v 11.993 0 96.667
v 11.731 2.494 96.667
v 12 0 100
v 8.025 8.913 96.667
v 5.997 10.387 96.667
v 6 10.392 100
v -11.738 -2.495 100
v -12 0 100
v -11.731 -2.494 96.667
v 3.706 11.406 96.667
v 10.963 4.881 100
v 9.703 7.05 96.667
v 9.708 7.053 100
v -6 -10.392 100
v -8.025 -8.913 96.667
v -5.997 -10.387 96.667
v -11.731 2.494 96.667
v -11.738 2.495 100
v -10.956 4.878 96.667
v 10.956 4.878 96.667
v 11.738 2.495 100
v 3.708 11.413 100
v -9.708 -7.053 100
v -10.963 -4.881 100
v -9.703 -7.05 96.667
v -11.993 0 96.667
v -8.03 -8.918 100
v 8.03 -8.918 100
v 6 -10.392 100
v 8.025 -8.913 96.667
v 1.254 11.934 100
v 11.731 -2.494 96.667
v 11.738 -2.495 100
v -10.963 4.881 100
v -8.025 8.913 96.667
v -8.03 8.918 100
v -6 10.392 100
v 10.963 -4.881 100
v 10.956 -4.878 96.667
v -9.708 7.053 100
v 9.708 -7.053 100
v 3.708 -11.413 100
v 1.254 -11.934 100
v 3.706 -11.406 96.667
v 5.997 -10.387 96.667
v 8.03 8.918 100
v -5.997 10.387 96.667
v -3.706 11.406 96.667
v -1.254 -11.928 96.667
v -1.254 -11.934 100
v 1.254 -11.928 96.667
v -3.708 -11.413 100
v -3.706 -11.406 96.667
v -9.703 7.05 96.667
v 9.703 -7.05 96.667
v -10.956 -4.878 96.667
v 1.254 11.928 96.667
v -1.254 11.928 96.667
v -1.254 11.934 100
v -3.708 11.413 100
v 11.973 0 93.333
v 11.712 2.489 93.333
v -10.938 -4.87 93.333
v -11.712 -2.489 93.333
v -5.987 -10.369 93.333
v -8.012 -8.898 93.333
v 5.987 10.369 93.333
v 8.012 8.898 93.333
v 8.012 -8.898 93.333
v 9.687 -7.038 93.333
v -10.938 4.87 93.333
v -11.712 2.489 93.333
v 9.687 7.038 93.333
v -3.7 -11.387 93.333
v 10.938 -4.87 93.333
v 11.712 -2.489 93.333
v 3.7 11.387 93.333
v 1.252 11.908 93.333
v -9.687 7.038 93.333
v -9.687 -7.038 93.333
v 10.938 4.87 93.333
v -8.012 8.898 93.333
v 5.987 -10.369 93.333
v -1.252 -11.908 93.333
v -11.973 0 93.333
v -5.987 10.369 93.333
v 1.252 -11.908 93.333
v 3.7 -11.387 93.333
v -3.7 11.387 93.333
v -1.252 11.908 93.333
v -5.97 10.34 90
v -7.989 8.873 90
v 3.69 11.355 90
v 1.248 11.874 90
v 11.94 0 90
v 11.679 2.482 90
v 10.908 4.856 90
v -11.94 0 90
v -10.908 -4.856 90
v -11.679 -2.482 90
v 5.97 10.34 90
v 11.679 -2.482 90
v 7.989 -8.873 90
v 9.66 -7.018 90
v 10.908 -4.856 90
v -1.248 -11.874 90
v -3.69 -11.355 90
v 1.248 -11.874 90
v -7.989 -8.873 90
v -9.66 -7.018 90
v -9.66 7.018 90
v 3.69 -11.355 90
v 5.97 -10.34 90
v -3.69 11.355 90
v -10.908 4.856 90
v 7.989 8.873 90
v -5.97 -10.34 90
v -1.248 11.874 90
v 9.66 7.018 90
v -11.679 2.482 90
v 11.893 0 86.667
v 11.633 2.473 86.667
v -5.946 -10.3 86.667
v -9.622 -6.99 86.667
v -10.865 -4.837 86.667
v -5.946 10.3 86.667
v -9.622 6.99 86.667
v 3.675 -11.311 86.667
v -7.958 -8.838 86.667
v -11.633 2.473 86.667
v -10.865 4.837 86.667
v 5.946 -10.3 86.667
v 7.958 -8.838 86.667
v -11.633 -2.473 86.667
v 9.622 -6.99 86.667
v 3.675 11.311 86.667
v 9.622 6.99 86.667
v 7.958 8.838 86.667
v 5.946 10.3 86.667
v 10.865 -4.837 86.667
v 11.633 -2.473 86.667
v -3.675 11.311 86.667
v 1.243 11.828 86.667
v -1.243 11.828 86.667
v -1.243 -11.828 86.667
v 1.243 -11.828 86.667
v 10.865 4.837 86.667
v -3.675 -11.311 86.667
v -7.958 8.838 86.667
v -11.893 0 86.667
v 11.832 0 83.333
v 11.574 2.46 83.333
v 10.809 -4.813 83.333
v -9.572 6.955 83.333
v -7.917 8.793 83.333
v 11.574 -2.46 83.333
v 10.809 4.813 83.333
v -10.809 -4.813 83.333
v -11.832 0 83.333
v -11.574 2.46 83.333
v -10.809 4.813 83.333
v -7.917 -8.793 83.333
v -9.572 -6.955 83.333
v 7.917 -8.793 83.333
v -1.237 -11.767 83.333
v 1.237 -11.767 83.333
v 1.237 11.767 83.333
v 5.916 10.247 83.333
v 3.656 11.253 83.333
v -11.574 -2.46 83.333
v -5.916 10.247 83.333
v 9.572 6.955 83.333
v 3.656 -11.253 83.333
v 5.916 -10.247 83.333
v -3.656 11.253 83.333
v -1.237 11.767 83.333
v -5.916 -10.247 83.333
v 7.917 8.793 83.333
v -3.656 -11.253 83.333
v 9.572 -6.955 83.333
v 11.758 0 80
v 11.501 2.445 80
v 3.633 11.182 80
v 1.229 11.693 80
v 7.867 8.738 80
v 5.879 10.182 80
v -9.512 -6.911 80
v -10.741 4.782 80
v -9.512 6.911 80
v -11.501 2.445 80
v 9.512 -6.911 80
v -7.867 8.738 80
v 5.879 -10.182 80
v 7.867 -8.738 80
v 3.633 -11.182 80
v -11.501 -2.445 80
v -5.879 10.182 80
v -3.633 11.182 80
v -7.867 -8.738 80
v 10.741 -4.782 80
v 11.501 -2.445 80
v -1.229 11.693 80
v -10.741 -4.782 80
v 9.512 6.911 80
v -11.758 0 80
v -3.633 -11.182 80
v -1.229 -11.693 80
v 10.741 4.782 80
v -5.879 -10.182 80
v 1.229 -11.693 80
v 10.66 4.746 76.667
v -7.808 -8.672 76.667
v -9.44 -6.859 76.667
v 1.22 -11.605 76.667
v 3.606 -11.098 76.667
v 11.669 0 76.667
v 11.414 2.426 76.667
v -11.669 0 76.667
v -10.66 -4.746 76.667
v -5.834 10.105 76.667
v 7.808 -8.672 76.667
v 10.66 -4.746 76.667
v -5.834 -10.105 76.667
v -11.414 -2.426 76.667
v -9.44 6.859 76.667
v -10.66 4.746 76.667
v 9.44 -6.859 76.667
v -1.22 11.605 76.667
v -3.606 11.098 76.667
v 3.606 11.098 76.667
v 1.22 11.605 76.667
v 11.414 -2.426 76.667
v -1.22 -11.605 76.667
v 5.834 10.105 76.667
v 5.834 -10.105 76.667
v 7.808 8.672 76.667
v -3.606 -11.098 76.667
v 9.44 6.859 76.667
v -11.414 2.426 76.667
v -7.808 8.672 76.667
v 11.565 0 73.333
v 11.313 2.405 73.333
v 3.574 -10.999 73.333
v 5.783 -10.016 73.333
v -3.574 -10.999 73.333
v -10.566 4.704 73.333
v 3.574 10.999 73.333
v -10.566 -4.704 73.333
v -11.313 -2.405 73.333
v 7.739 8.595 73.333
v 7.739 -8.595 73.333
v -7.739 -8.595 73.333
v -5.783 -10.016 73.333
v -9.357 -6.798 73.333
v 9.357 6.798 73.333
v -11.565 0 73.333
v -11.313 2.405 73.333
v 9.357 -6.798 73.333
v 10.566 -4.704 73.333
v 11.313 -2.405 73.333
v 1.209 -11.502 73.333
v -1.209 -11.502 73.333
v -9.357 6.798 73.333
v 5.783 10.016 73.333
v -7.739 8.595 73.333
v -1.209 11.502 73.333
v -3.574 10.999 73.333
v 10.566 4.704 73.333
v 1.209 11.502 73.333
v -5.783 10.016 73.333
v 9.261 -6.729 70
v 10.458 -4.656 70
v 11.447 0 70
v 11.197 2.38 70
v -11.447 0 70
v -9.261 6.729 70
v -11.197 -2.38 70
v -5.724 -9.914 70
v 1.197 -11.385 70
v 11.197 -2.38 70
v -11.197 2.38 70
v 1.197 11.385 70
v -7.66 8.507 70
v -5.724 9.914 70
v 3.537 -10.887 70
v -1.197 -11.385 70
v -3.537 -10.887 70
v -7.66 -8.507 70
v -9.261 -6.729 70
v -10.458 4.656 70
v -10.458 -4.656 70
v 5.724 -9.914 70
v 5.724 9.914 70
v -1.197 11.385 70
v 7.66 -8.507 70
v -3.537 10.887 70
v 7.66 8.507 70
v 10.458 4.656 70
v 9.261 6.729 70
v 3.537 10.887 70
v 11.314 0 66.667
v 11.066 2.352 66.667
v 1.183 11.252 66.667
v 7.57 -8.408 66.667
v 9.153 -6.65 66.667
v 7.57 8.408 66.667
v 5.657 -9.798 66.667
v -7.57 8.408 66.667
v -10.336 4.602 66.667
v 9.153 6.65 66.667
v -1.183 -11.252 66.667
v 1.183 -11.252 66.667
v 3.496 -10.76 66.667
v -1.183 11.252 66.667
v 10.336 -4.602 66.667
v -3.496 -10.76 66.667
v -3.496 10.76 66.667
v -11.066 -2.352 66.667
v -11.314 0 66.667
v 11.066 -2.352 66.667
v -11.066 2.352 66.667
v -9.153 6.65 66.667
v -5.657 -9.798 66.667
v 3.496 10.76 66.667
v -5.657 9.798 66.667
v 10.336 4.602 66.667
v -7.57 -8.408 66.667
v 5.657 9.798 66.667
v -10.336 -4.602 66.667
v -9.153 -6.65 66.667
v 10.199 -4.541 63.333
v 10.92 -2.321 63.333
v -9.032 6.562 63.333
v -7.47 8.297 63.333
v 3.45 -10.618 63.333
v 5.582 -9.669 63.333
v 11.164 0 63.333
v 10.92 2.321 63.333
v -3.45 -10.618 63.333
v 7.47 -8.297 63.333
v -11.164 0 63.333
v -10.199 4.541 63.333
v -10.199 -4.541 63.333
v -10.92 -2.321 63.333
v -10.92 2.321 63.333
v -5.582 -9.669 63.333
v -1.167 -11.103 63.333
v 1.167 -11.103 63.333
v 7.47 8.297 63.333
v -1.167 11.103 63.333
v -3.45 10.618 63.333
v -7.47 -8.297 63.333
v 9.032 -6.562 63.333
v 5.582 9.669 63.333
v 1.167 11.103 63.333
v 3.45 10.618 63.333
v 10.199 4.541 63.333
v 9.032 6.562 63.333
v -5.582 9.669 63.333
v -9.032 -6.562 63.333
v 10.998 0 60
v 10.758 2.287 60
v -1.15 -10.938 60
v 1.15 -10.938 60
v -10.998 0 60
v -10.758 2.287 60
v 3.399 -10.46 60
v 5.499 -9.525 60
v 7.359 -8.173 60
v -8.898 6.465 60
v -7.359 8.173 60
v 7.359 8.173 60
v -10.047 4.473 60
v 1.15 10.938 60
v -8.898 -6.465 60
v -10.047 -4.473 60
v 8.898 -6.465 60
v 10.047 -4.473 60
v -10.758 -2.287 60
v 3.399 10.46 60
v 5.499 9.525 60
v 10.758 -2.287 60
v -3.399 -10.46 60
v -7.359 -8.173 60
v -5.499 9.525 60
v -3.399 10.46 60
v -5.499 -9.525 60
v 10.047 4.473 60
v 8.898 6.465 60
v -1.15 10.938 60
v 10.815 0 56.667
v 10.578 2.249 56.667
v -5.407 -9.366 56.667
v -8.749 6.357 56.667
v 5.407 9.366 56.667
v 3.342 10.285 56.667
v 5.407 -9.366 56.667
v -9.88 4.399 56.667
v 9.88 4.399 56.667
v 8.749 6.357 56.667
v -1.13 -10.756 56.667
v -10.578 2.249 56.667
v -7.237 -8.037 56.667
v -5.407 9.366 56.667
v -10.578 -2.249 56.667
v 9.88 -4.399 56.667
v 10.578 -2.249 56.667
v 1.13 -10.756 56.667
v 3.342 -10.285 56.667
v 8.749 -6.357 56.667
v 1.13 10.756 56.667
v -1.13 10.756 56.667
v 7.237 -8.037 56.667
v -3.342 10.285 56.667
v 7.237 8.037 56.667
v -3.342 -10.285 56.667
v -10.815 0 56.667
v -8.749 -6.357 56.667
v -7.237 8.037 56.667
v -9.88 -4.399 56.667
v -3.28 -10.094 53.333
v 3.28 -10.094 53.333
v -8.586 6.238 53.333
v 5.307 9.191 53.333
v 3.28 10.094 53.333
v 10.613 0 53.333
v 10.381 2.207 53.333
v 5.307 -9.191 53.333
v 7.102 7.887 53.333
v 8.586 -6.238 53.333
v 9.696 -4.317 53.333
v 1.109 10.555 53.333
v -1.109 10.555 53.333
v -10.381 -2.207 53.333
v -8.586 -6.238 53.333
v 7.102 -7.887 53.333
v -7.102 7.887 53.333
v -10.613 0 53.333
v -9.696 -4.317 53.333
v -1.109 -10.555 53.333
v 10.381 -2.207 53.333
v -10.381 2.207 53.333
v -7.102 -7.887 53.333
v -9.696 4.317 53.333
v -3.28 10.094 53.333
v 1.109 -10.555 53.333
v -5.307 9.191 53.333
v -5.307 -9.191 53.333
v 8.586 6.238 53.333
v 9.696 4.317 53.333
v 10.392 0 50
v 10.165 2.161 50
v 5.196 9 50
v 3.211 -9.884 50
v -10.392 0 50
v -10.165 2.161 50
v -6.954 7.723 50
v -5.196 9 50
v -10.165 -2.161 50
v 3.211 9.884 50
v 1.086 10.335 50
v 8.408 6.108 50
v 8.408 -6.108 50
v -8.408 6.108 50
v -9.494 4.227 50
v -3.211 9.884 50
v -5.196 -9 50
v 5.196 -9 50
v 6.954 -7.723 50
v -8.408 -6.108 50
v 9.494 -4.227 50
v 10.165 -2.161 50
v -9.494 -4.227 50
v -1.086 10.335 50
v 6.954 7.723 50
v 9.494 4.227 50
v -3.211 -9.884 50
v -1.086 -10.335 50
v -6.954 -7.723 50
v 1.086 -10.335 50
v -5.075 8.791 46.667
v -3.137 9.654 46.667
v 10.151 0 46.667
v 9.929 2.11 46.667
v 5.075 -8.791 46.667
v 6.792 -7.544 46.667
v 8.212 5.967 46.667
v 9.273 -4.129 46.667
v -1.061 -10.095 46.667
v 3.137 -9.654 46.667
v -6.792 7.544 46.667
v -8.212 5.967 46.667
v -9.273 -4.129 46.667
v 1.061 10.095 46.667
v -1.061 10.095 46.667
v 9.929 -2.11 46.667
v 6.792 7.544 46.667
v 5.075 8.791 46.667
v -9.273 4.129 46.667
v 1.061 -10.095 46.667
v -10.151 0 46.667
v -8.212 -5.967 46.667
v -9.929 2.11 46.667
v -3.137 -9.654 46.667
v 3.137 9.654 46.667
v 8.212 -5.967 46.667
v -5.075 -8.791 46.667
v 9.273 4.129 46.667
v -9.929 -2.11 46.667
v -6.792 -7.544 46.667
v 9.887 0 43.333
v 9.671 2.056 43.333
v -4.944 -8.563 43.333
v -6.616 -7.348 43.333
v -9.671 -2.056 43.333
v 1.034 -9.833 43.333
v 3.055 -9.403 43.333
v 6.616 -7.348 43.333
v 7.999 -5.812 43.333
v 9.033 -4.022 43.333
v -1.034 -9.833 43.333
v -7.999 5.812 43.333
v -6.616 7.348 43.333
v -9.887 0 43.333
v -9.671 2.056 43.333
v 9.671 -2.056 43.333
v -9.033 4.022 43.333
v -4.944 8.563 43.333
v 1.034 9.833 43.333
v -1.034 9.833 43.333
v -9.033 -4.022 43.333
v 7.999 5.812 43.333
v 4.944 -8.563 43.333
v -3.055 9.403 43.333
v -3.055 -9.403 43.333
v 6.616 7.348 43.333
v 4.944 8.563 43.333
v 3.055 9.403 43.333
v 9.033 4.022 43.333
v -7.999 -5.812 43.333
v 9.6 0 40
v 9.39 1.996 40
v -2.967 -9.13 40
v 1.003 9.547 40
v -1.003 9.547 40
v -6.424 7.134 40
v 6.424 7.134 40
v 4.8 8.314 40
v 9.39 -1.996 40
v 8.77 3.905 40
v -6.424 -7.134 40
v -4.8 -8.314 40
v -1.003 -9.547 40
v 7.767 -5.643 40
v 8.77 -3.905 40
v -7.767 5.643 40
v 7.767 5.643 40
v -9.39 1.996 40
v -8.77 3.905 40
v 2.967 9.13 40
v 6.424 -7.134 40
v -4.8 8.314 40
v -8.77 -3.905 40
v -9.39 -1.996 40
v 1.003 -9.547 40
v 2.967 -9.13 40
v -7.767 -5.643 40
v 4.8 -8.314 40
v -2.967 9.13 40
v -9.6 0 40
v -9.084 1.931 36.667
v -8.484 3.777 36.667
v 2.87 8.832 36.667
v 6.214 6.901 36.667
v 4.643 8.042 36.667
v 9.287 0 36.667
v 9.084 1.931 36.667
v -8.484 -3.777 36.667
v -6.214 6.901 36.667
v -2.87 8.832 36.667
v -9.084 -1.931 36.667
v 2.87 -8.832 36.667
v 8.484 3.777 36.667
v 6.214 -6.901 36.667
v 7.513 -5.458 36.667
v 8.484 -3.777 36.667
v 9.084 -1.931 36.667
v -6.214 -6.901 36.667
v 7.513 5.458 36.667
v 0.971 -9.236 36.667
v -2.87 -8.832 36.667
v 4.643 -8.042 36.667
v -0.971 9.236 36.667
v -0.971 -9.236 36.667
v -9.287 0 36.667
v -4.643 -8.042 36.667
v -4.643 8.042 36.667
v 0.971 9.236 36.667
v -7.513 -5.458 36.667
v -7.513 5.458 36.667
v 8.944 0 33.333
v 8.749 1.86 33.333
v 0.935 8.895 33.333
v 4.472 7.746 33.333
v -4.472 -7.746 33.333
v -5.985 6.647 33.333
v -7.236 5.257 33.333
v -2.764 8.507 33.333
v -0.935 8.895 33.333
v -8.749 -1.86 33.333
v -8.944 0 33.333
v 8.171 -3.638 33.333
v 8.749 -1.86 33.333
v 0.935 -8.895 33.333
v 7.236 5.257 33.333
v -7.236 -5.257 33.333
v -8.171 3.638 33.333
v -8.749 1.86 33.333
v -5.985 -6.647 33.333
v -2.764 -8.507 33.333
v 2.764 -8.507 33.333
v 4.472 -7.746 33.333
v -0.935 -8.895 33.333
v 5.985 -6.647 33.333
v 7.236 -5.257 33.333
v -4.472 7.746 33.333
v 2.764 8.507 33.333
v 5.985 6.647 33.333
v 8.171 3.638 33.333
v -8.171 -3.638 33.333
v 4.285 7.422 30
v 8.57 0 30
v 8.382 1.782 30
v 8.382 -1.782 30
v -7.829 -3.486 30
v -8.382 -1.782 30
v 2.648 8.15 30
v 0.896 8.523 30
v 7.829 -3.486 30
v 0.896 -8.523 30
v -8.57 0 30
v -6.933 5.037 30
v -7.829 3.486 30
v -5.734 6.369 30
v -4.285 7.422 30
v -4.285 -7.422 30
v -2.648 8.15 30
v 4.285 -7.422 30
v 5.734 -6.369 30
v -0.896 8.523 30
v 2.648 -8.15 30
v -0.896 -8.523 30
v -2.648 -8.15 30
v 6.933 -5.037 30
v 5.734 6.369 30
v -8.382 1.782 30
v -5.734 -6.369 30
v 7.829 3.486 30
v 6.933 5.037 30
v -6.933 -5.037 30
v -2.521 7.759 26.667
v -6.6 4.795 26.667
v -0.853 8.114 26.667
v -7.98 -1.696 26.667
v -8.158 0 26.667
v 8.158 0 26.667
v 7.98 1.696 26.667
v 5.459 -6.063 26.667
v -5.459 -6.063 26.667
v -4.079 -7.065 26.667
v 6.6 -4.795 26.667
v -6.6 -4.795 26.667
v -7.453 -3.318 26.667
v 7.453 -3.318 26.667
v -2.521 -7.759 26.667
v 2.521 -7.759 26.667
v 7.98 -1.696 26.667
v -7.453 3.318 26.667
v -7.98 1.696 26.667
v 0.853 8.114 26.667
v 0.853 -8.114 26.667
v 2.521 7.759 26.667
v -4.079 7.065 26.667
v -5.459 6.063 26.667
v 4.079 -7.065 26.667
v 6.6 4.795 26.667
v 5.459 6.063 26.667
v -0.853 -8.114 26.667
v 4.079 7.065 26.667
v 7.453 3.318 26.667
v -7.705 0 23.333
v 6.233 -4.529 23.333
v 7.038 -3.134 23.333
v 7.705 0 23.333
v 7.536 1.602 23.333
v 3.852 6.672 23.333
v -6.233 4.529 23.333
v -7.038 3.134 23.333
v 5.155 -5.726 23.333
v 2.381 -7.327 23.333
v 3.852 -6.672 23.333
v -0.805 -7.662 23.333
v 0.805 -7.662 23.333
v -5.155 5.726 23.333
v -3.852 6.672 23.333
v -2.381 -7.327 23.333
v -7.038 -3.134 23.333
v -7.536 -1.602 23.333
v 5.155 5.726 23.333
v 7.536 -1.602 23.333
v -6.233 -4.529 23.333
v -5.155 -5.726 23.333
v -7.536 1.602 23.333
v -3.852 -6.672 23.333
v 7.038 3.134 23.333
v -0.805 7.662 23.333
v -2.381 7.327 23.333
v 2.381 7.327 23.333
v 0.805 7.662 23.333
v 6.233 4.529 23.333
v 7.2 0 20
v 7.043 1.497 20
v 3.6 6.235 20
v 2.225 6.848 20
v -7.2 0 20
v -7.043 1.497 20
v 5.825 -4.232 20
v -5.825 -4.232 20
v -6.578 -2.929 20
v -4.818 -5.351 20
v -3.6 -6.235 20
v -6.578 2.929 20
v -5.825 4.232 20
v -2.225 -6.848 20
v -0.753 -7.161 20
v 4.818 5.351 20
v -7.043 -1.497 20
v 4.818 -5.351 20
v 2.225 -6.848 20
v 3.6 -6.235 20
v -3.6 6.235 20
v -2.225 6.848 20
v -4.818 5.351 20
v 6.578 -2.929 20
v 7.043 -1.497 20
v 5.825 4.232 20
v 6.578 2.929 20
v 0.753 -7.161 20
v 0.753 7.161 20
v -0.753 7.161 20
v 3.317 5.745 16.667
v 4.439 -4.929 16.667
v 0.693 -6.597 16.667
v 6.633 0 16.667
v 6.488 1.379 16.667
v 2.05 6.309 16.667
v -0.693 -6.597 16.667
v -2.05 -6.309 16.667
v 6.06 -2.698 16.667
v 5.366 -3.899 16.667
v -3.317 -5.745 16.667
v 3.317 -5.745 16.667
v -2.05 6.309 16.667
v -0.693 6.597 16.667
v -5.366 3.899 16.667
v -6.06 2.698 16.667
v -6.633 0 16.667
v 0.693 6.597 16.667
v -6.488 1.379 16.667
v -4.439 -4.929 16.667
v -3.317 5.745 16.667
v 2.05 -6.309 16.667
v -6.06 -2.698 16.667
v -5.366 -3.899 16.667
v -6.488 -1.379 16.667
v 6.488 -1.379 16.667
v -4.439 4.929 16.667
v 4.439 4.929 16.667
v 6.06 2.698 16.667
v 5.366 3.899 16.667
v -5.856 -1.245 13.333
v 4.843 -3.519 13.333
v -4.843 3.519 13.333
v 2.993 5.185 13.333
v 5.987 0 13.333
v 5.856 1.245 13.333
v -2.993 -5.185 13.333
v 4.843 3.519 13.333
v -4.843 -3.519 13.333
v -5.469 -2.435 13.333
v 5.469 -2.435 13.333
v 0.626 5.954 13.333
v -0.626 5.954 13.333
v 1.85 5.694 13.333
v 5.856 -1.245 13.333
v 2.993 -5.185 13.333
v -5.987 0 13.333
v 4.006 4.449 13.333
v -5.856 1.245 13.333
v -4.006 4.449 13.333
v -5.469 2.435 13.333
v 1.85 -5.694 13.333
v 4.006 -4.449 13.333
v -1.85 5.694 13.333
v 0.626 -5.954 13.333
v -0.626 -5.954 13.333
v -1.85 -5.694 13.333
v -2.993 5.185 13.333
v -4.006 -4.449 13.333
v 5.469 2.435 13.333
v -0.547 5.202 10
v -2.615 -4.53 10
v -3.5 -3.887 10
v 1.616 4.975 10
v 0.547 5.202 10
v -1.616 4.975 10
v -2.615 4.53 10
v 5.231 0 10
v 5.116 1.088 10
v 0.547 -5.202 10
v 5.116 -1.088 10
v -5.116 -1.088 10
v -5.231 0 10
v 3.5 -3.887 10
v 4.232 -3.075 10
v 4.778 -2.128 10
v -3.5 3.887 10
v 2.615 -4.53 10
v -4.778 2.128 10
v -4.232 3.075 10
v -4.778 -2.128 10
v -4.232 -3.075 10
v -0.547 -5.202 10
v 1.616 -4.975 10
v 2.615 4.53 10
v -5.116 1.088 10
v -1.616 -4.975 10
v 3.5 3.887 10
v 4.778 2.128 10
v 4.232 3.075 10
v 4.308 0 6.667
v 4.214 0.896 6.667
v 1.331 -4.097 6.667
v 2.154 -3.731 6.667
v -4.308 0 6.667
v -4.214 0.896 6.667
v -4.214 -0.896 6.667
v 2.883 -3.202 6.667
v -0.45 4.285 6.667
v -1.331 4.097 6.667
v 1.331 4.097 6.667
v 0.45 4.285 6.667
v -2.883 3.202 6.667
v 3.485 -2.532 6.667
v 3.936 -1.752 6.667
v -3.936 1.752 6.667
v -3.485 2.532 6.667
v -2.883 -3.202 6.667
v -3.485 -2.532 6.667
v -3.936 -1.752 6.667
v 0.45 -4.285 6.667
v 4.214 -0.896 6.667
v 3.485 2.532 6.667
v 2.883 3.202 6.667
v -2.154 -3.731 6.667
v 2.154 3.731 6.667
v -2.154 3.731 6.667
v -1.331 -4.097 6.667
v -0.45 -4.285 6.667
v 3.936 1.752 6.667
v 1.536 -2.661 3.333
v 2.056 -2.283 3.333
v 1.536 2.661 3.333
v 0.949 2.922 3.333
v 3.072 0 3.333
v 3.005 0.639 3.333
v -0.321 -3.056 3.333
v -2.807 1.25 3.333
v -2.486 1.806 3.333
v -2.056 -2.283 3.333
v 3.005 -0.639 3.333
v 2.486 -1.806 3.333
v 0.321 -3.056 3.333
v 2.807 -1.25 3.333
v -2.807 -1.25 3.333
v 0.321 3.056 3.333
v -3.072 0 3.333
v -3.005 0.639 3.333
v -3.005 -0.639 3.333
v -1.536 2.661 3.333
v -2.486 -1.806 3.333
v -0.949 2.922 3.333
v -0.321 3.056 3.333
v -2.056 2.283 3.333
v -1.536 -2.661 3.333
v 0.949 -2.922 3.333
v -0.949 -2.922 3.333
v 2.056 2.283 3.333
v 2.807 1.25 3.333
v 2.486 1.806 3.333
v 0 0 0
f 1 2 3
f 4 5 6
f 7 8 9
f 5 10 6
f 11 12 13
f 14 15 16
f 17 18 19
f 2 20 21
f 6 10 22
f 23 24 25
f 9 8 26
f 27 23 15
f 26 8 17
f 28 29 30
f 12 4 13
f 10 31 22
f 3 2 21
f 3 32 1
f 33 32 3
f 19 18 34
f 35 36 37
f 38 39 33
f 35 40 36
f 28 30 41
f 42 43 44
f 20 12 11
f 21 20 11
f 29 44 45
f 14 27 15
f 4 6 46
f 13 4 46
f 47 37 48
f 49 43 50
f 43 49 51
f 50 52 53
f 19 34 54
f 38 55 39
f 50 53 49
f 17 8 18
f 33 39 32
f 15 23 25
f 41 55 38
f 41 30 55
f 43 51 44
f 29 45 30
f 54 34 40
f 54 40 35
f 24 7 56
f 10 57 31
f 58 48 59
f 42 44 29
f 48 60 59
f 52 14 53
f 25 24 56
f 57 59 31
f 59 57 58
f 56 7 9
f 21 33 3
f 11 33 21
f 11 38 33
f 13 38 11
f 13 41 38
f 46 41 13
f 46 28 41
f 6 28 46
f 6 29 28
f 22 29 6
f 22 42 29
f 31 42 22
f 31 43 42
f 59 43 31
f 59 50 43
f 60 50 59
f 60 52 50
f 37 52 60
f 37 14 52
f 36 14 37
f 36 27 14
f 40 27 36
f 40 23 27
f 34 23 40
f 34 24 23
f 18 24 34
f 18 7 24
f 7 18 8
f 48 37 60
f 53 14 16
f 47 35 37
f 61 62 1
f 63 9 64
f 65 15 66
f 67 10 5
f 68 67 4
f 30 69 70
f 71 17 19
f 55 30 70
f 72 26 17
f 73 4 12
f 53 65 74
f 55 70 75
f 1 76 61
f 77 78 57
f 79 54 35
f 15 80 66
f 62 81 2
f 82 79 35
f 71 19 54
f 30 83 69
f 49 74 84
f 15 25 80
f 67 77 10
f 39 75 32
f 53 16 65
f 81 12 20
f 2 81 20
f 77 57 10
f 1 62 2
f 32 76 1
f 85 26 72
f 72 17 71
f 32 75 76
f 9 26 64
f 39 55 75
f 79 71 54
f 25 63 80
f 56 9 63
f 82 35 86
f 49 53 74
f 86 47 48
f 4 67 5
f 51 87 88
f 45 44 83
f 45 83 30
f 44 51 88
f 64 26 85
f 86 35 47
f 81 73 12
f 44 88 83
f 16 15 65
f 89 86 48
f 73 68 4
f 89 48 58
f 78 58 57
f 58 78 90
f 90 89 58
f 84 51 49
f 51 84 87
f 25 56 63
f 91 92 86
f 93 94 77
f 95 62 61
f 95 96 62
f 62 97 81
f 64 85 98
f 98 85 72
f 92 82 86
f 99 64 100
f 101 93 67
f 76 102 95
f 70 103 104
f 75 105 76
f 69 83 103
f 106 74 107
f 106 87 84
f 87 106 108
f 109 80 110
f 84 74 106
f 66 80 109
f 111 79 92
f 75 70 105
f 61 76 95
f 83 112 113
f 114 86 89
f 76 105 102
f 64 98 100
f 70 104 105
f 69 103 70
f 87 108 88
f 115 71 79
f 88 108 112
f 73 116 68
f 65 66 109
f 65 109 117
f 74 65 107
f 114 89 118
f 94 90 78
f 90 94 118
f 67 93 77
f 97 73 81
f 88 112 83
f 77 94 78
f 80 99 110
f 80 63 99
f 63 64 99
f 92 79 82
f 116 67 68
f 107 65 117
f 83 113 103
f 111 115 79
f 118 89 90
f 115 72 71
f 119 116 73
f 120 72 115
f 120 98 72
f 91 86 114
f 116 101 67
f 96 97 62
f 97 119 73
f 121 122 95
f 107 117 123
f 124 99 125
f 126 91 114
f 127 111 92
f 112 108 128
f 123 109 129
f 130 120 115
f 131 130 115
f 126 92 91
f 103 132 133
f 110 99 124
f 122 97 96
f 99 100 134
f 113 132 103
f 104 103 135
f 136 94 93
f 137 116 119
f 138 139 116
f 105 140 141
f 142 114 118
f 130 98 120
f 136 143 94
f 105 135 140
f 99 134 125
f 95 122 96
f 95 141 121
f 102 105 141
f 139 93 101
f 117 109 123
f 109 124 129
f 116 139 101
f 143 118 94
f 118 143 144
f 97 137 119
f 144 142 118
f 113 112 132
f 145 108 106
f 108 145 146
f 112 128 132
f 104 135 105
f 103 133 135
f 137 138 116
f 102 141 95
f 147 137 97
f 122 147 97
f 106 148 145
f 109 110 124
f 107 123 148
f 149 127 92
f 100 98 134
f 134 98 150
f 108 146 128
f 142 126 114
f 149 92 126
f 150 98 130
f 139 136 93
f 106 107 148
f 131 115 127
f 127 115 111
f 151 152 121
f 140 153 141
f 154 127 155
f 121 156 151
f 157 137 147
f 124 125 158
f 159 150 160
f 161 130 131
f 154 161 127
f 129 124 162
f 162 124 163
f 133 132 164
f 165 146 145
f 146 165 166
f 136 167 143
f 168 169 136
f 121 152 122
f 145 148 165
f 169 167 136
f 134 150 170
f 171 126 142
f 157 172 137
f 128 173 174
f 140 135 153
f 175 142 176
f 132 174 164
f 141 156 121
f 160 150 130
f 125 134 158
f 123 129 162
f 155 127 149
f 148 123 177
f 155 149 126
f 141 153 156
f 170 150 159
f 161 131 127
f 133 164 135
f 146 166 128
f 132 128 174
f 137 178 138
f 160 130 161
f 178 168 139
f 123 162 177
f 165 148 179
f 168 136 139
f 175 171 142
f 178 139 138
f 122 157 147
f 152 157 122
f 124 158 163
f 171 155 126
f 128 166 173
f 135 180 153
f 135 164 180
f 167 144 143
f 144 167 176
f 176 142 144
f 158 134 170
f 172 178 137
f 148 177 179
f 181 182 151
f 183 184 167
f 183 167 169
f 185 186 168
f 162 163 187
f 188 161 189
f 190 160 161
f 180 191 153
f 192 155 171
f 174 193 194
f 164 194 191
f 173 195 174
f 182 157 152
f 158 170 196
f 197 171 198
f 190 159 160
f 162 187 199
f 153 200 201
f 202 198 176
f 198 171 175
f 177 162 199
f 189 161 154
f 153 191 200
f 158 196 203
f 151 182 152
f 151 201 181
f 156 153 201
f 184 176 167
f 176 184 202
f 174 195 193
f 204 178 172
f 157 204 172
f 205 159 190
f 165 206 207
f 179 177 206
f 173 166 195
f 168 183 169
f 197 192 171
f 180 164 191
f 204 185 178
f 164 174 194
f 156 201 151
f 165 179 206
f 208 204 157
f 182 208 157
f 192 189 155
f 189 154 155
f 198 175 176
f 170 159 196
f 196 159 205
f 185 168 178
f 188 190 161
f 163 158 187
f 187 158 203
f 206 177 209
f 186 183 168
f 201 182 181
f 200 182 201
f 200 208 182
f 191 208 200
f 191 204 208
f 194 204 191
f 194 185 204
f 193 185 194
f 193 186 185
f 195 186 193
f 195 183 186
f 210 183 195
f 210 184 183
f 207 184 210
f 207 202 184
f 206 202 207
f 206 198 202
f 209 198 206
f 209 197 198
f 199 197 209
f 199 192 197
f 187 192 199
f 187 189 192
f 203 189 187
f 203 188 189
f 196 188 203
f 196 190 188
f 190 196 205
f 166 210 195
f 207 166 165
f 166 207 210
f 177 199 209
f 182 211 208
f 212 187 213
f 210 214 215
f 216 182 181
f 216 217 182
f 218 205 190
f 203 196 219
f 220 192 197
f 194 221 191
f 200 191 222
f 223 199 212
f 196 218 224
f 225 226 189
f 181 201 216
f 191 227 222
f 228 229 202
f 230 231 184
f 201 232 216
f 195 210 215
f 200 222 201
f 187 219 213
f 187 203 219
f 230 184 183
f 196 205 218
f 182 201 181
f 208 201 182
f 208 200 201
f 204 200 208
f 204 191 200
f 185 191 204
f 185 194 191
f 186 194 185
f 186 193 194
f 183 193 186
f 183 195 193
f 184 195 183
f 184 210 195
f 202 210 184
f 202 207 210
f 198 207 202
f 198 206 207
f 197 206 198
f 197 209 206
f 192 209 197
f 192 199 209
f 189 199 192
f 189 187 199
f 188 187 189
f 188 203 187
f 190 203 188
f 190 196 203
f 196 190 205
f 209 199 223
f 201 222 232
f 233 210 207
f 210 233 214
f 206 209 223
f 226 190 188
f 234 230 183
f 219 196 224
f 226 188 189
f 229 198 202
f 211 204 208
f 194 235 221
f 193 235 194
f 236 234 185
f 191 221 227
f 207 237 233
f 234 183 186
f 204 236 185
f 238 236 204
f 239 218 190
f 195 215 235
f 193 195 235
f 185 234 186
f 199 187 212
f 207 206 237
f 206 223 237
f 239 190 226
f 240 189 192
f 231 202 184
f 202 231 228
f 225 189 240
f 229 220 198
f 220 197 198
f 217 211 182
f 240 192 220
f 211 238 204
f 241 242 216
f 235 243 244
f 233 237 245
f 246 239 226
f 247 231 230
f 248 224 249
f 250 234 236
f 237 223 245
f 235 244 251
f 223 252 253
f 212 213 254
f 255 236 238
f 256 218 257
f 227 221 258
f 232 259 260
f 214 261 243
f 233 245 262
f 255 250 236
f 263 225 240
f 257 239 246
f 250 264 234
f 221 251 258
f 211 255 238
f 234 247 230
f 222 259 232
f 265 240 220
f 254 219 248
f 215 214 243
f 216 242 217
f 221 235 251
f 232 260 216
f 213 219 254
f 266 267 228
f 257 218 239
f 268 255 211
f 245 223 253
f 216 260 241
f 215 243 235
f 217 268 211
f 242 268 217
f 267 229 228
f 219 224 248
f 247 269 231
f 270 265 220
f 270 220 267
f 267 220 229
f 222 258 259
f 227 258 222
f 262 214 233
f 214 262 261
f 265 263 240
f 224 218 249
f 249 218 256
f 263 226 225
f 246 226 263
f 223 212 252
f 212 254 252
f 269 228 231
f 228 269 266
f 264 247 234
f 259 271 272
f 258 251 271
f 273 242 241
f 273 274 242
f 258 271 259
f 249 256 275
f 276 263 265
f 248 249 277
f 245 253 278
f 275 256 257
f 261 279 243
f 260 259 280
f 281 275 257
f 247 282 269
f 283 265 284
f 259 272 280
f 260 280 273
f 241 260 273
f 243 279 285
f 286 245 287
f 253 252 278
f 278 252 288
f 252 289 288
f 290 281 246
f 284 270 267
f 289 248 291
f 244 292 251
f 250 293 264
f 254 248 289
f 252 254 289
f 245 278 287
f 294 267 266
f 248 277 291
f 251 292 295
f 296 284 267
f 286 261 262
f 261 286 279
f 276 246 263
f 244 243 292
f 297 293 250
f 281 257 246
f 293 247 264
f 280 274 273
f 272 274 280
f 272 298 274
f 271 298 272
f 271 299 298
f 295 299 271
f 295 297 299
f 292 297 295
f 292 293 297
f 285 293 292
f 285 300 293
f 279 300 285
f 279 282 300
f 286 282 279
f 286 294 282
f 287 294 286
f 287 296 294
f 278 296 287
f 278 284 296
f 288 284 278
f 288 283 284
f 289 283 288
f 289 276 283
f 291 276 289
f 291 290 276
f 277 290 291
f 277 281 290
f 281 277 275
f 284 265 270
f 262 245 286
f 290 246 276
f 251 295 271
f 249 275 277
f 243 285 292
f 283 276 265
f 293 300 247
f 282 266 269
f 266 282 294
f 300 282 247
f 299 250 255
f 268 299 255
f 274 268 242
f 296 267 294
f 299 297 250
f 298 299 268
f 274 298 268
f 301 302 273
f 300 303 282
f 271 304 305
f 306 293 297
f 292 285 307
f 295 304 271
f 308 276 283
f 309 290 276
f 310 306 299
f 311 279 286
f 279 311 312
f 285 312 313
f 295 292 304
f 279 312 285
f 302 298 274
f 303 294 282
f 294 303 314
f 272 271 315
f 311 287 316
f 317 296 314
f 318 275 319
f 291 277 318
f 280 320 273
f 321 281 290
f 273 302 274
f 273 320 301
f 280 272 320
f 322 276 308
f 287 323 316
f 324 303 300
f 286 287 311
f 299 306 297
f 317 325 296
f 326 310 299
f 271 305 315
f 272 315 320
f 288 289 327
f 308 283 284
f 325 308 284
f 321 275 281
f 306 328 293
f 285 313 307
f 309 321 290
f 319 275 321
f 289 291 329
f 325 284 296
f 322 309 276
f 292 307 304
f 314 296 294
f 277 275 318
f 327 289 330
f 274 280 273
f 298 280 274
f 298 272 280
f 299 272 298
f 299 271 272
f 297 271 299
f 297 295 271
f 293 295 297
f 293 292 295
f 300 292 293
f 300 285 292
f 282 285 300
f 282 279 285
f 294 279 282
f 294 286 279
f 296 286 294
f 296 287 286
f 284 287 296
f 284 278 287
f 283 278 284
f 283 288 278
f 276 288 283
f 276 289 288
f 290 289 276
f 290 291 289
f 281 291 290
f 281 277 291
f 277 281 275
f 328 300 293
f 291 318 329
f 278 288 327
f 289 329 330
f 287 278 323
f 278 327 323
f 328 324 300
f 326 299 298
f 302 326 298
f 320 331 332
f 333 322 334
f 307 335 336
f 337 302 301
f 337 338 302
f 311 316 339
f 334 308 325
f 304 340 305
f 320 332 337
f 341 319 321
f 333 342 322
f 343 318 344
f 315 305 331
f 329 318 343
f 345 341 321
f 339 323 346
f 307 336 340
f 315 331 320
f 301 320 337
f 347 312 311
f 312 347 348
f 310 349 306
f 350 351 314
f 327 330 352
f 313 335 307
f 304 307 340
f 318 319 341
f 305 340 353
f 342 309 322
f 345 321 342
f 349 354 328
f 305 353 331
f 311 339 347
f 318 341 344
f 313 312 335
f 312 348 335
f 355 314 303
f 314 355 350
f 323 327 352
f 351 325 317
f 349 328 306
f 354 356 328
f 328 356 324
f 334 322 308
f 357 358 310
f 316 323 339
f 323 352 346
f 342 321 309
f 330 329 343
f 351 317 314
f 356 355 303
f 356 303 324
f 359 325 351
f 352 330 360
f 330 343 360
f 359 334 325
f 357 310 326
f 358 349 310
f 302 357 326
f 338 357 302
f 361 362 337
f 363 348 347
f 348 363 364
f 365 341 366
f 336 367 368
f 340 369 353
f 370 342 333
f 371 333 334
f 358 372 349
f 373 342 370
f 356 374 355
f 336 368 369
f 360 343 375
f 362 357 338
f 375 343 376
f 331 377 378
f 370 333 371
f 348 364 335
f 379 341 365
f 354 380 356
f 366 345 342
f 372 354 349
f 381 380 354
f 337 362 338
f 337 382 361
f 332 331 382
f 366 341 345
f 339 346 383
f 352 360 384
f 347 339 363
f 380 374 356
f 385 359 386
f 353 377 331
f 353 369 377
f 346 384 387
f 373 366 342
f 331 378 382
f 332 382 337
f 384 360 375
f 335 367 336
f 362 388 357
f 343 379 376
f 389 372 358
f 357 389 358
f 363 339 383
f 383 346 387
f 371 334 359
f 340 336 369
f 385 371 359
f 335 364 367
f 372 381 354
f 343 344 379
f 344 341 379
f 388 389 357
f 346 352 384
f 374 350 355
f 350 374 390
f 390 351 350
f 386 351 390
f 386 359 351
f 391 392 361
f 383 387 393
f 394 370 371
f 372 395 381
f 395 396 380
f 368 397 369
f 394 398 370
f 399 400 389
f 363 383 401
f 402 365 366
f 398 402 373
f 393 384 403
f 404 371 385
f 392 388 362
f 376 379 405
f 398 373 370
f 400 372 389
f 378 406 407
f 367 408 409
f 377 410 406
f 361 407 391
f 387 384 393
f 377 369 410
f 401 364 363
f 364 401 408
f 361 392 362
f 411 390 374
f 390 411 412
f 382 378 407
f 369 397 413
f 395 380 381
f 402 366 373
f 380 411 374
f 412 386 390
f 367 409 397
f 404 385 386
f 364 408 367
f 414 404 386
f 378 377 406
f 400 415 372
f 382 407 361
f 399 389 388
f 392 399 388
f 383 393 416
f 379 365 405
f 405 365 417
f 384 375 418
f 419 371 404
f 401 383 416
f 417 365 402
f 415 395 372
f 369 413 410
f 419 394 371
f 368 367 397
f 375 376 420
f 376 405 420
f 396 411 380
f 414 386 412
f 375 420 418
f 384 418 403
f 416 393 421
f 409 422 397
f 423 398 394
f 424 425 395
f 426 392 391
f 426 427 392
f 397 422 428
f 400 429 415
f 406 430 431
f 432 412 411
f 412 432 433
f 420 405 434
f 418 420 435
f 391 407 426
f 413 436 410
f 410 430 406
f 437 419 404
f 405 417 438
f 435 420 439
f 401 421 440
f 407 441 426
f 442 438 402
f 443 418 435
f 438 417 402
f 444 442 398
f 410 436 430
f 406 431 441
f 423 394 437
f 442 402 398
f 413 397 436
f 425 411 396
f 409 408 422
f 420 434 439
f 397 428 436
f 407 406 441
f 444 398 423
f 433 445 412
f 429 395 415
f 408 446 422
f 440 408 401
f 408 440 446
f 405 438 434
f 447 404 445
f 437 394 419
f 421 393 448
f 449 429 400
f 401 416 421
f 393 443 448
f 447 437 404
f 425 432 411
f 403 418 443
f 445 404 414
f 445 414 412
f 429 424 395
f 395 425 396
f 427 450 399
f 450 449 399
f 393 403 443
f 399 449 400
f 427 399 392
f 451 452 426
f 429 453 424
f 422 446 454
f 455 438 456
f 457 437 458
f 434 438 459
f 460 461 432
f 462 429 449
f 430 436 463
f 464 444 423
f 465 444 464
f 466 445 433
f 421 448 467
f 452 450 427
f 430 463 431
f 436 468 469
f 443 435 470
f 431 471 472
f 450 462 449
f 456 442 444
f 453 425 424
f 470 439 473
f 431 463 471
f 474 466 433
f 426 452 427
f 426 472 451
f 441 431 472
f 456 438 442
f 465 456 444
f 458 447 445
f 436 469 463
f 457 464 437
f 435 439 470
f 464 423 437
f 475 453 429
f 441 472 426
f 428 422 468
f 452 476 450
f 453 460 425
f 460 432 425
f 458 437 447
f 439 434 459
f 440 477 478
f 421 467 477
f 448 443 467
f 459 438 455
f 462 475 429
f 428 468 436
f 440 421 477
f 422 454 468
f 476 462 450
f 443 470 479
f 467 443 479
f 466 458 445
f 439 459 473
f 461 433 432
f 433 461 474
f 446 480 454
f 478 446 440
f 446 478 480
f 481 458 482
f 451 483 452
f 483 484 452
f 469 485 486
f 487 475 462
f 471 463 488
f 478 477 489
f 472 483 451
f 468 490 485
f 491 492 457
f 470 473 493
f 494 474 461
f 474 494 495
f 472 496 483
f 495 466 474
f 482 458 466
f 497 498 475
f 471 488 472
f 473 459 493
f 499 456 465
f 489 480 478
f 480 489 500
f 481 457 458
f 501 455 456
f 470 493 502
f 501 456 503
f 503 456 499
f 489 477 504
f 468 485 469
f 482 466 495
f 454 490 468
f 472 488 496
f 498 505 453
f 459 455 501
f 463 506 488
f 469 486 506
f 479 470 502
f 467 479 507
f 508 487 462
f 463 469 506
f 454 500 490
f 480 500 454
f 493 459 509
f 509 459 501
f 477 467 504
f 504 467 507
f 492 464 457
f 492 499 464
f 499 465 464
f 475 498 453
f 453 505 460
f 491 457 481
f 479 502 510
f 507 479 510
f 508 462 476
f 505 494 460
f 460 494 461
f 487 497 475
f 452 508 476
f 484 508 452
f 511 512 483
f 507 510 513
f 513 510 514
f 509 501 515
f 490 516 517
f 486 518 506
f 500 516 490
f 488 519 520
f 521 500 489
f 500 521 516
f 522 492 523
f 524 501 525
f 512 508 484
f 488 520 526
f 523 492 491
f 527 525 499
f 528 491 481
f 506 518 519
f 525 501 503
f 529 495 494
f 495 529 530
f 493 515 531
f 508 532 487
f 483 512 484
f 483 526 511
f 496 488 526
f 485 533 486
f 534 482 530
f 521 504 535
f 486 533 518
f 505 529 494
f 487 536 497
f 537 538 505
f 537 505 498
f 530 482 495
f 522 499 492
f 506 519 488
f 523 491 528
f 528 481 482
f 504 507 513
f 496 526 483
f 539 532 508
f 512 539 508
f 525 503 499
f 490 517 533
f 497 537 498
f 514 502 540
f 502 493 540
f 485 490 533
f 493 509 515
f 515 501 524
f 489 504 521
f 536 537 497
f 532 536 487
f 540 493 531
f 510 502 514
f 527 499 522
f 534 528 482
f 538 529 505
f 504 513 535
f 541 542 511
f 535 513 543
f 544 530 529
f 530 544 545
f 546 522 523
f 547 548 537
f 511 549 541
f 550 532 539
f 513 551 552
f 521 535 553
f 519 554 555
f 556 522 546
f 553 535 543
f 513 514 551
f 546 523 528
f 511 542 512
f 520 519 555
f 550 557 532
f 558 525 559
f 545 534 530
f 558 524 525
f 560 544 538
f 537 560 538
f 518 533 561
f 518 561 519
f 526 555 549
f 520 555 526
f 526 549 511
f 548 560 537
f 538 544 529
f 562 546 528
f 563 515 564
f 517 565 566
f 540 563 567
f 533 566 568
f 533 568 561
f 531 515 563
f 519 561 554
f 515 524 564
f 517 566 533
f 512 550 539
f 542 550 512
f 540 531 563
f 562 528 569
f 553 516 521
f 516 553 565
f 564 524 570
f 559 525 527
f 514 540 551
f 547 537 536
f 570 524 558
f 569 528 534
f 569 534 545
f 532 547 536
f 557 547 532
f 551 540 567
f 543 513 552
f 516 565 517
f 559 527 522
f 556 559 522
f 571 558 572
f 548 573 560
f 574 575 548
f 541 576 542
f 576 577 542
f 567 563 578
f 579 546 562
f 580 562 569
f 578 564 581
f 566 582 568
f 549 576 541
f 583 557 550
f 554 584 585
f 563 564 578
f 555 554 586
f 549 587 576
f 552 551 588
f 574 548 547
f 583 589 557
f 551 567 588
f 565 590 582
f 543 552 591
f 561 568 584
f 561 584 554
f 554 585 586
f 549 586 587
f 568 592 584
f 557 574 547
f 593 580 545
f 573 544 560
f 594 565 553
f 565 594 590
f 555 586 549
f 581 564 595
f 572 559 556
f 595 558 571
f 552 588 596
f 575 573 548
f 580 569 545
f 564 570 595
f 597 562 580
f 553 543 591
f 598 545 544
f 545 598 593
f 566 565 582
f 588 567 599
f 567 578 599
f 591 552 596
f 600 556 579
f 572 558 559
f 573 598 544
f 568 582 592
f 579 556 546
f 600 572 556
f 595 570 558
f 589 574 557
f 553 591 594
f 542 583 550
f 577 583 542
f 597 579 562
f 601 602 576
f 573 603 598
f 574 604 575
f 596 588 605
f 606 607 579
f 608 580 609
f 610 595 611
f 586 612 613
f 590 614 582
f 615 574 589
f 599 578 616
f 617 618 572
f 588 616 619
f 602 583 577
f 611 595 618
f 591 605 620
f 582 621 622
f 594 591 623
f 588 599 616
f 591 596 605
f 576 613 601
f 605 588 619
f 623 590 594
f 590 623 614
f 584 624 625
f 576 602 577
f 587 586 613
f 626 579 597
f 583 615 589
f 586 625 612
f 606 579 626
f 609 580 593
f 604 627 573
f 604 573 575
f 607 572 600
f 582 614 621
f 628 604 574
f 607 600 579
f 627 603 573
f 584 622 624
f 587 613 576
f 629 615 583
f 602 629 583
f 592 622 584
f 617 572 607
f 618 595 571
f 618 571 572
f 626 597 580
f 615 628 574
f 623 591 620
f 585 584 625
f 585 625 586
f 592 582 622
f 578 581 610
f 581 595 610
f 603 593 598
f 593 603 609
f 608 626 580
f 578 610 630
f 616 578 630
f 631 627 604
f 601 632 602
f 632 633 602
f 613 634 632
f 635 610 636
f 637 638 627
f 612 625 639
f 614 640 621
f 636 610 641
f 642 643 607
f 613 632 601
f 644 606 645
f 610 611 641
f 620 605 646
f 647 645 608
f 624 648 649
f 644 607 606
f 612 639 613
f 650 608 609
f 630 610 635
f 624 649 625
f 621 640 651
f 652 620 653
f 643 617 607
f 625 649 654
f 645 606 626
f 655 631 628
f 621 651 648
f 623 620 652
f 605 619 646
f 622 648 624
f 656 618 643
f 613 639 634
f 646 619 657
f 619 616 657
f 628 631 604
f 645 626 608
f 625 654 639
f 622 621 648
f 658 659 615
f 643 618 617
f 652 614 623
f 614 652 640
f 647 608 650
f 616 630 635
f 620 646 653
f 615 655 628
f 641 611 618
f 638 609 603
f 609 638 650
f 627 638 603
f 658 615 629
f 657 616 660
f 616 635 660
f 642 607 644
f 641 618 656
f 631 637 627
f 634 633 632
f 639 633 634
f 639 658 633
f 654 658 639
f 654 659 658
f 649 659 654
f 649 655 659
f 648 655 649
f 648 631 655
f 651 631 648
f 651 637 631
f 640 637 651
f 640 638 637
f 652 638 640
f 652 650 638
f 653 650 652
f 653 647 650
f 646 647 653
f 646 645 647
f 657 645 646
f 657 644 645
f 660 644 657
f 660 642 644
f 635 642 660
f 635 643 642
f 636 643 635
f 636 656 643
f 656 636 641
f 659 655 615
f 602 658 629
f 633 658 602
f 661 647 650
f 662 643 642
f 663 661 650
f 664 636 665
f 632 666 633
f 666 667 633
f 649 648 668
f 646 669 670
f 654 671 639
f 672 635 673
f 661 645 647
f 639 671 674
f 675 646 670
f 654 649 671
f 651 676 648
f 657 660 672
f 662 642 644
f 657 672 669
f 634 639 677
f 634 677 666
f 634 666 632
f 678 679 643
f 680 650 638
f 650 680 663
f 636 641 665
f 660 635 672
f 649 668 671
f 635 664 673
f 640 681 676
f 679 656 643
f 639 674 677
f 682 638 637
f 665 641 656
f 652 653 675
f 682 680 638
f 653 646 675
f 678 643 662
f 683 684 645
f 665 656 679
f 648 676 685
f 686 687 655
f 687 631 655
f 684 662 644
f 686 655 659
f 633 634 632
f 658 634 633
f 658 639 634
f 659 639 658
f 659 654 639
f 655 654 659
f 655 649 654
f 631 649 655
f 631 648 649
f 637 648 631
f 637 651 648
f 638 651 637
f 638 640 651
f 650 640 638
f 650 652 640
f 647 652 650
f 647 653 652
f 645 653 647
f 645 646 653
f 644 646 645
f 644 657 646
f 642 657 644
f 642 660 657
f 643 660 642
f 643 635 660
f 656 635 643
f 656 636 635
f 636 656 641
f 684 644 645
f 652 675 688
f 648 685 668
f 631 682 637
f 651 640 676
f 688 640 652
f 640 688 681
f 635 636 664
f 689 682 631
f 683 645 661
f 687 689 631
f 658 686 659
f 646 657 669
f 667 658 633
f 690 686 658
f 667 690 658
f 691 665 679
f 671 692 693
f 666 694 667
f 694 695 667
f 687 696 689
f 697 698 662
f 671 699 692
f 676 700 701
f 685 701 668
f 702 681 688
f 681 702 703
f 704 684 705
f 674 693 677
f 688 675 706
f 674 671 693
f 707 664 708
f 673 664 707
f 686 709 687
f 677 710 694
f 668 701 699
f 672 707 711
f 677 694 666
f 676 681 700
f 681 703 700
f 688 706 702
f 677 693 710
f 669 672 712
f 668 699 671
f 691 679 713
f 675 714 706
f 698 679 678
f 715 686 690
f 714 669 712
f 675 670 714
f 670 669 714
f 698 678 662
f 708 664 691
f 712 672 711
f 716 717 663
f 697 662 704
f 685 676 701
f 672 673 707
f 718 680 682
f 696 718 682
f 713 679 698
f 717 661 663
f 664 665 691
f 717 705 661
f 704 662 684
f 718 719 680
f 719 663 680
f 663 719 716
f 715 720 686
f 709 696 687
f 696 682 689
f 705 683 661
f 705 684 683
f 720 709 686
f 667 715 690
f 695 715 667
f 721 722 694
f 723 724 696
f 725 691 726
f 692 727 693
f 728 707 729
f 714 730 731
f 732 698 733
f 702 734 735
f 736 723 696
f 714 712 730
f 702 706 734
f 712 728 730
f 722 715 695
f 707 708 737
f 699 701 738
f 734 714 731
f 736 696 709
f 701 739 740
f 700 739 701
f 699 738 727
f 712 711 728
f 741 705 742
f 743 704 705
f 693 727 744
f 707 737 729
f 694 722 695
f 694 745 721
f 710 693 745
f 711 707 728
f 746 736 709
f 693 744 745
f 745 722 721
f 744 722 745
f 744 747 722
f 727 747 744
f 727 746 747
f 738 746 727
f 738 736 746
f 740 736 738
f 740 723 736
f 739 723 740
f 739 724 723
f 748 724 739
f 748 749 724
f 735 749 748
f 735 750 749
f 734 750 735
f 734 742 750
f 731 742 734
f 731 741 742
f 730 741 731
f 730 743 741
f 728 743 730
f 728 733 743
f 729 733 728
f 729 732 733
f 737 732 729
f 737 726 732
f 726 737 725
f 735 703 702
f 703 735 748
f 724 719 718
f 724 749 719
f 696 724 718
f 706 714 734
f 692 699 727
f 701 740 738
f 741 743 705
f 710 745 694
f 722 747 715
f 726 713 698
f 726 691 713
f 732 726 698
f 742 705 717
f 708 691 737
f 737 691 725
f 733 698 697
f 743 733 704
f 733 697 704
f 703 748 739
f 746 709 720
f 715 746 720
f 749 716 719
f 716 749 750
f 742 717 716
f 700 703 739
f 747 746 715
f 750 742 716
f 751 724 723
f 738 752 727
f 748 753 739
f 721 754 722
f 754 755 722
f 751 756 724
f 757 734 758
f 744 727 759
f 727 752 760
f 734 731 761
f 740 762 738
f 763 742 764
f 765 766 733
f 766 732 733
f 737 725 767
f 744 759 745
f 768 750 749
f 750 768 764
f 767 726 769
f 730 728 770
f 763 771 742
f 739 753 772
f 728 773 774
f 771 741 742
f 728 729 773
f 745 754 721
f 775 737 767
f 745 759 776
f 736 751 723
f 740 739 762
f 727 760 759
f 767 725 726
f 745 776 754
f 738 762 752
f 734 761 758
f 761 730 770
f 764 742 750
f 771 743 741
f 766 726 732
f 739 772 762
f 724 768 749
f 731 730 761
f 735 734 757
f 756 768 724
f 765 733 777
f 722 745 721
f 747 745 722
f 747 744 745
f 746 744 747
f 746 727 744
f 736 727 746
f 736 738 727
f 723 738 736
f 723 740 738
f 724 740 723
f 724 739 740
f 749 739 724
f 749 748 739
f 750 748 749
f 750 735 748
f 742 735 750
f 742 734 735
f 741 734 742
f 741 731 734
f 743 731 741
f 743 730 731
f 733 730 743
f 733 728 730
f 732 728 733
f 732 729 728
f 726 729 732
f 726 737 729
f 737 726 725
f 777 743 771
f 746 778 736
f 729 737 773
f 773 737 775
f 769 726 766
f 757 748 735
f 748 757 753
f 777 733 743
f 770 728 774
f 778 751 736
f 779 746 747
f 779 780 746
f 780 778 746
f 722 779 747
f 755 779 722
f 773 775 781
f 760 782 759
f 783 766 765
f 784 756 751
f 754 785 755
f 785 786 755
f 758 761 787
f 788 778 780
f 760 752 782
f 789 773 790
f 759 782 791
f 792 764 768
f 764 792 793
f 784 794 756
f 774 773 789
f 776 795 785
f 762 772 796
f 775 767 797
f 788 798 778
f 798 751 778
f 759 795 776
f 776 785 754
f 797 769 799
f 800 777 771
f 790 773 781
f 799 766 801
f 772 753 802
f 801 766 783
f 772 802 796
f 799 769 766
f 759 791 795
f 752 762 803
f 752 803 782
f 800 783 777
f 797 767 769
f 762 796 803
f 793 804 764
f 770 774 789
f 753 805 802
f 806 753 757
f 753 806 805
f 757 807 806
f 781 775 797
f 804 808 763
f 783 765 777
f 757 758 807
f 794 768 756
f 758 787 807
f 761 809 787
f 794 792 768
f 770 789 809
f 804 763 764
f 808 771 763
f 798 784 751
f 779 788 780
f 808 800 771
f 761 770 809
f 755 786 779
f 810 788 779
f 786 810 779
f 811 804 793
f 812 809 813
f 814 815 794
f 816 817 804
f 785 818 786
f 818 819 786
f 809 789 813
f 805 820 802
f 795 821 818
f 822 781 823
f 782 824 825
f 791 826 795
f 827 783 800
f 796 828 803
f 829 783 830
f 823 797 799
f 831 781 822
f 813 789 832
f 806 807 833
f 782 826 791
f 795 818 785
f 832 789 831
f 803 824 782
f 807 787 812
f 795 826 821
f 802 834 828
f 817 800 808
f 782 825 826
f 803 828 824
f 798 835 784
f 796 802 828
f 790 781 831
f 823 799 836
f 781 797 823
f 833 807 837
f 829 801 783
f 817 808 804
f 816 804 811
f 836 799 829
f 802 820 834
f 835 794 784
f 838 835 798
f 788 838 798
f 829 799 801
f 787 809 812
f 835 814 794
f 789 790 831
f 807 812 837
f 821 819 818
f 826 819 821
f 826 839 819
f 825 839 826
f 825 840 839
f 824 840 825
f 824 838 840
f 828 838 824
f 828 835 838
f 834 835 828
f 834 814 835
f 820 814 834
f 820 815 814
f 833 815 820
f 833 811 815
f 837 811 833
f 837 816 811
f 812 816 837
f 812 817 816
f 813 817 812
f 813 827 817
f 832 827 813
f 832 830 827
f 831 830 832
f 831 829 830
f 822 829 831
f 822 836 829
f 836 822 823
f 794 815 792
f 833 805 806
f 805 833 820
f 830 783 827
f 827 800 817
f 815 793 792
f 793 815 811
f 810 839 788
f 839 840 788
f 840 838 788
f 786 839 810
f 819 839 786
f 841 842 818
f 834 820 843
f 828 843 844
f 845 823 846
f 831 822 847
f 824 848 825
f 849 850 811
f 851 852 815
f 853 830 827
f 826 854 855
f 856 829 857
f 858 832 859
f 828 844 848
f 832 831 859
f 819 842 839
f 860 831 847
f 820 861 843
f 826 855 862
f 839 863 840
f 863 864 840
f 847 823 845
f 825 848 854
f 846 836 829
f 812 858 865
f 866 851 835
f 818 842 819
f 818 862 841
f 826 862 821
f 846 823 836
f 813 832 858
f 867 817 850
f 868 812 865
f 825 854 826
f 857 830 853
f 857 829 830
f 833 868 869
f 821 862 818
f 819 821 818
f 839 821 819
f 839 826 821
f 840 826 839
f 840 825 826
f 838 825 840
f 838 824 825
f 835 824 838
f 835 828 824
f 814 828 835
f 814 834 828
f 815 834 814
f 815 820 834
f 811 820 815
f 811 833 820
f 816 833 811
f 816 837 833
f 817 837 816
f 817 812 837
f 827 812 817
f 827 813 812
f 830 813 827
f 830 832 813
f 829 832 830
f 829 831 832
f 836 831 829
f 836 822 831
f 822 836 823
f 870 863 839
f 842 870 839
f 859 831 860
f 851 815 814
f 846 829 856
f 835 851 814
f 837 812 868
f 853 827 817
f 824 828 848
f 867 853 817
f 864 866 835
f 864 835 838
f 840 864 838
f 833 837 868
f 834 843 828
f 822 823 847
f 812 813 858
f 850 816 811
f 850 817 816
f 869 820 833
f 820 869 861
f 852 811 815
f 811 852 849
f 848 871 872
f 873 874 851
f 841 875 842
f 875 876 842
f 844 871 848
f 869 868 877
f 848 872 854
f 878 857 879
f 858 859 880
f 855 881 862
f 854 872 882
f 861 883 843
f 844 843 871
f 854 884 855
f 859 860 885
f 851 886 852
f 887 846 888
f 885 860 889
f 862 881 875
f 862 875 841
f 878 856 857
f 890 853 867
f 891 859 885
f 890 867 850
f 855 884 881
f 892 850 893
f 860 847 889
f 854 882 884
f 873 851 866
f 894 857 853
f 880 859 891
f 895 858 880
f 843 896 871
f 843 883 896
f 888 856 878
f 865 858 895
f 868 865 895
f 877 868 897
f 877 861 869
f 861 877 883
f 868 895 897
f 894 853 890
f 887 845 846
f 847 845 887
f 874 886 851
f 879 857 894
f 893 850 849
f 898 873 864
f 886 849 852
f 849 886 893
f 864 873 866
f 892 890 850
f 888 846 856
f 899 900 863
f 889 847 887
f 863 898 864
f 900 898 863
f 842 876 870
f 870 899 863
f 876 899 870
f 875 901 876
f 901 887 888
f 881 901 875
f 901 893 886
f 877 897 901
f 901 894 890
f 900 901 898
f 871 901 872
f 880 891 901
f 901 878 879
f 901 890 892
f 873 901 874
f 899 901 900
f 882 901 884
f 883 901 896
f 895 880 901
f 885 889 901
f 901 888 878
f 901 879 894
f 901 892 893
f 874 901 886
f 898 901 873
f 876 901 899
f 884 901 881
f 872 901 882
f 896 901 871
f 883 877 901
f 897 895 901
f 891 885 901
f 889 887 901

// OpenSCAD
/* Elliptical ogive */

/* 

y= R * sqrt(1 - (x^2)/(L^2))

*/

L= 100;
R=24/2;
nof = 30;

$fn=30;
H2=L/nof;
x1= 0;
x2=0;
A1=0;
A2= 0;
module ogive()
{

	for (i=[1:nof]) {

assign(x1 = ((L/nof)*(i-1)),
x2 = ((L/nof)*i),
A1 = R * sqrt(1 - (pow(((L/nof)*(i-1)), 2) / pow(L,2))),
A2 = R * sqrt(1 - (pow(((L/nof)*i), 2) / pow(L,2))),
H1= (L/nof)*i)
		{
	  translate ([0,0, L- H1]) cylinder (r1 = A2, r2 = A1 , h= H2);
		echo("i=", i ,"h=",H1,"r1:",A1,"r2:", A2, "x1:", x1, "x2", x2);
		}
	}
}

ogive();
